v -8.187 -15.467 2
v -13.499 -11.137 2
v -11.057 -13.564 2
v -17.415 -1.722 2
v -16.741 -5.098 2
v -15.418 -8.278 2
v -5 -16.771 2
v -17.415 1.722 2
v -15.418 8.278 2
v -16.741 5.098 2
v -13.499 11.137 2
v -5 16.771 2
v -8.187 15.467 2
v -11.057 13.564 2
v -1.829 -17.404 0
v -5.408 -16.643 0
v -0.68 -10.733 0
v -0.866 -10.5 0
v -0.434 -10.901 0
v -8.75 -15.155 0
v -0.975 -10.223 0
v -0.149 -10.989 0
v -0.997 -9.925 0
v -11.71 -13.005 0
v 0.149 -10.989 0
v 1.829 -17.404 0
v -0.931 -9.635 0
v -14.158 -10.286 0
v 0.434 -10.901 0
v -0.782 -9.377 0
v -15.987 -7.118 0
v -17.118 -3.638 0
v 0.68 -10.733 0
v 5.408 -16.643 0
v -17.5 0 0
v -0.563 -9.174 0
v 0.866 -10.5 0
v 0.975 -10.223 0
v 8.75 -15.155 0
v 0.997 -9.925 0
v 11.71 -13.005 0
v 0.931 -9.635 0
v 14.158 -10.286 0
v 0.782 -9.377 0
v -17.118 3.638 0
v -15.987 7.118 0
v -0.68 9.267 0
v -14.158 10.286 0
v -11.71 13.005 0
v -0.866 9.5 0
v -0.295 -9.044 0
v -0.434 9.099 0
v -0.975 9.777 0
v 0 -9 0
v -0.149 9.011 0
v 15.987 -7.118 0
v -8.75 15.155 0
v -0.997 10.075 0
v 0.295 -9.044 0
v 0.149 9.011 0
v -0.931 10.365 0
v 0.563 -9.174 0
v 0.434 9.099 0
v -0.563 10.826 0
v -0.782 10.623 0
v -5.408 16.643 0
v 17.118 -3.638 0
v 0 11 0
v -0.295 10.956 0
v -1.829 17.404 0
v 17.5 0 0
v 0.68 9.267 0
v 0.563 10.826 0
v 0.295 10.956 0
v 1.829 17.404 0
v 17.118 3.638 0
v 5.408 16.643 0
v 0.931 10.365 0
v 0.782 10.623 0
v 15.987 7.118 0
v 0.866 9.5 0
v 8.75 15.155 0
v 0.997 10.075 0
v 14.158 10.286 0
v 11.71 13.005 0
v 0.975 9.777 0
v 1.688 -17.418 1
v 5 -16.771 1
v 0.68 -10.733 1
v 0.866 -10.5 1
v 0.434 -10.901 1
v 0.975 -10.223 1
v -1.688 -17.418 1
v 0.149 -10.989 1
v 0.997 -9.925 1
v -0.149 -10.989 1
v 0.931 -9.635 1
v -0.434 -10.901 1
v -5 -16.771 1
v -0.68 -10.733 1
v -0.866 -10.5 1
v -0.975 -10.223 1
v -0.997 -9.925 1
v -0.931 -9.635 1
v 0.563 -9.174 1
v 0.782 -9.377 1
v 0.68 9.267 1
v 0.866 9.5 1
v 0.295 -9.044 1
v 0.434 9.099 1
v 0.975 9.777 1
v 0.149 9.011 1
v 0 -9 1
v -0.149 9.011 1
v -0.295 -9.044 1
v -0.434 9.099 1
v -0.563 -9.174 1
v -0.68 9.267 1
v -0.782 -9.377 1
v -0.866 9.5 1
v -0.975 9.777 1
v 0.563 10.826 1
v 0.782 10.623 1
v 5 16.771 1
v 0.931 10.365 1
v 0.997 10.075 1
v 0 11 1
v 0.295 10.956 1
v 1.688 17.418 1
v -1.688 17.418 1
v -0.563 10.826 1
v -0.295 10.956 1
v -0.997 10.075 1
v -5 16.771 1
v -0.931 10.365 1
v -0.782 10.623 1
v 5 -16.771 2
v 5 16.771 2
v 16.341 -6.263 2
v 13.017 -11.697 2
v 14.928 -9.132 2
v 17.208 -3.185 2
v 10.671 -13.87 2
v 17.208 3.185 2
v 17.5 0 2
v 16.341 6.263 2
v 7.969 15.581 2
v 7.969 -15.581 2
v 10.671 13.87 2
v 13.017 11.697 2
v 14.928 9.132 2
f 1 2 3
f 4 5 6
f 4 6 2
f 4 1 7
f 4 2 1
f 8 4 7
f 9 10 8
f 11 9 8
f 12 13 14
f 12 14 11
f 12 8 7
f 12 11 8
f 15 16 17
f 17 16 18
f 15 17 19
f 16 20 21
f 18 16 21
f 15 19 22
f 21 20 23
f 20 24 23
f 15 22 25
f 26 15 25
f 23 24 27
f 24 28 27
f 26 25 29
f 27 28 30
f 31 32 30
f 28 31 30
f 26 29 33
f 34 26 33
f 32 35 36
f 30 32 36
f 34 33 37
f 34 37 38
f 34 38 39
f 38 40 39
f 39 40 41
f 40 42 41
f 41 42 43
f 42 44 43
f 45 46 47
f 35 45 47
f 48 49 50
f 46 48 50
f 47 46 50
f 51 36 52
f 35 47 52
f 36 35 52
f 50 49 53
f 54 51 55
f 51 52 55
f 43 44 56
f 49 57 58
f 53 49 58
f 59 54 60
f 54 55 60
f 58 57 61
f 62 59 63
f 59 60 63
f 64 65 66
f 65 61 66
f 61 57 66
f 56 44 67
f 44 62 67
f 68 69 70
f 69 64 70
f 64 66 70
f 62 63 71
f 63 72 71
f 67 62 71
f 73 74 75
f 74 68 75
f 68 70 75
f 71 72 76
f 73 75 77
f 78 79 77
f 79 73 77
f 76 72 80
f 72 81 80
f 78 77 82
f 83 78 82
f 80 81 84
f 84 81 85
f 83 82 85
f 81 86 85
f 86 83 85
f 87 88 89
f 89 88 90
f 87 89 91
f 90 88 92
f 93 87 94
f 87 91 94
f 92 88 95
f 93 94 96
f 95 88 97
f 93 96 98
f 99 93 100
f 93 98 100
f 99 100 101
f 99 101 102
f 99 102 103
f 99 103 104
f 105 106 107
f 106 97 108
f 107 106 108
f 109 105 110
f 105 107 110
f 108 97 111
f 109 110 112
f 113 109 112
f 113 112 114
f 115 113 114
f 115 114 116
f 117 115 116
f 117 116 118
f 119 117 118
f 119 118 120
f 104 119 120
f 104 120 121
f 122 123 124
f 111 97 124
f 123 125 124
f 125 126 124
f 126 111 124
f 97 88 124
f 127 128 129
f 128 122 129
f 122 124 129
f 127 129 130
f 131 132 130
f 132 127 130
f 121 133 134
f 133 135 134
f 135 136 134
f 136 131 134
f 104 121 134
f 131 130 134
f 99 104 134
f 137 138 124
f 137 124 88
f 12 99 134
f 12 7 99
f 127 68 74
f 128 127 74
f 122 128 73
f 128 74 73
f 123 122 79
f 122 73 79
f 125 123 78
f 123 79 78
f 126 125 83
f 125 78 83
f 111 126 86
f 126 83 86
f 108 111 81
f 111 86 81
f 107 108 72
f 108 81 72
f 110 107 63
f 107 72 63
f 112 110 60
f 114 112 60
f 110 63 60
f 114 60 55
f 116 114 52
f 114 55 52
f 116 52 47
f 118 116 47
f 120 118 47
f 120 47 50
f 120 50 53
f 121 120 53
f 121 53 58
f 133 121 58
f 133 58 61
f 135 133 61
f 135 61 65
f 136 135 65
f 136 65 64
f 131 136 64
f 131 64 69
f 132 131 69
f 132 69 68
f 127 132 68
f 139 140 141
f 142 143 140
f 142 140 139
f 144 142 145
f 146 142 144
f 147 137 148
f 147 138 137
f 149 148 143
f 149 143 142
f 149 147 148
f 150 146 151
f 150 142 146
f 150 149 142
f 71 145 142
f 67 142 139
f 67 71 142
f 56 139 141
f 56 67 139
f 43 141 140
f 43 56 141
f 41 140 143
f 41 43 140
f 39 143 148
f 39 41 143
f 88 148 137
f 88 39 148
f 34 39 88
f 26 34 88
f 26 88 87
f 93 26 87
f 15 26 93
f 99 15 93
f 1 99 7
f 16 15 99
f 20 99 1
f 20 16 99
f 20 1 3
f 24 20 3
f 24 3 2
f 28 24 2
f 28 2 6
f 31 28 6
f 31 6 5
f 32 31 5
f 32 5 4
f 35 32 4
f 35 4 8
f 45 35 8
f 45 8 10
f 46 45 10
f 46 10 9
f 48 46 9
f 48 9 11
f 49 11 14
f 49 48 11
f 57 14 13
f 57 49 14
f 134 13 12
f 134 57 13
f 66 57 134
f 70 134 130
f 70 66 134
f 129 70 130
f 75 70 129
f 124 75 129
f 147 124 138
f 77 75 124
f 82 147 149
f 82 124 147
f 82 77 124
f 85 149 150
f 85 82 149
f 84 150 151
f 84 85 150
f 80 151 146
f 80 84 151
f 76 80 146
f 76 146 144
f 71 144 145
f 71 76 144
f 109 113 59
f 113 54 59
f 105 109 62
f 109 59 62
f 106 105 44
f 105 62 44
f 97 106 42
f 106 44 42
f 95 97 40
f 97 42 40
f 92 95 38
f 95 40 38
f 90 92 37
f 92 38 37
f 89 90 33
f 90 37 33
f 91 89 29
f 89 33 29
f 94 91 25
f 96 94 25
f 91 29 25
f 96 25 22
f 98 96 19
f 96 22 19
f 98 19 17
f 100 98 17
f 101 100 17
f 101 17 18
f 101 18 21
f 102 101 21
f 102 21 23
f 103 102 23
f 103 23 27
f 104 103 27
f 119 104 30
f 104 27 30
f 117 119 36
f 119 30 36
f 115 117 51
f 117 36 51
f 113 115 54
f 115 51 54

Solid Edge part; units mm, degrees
sketch "Sketch1" plane through (0, 0, 0) normal (0, 0, 1) x (1, 0, 0)
  circle A0 centre (0, 0) radius 17.5
extrude "Protrusion1" add sketch "Sketch1" along normal blind 2
sketch "Sketch2" plane through (0, 0, 2) normal (0, 0, 1) x (1, 0, 0)
  line L0 (-5, 17.5) -> (5, 17.5)
  line L1 (5, 17.5) -> (5, -17.5)
  line L2 (5, -17.5) -> (-5, -17.5)
  line L3 (-5, -17.5) -> (-5, 17.5)
  dimension "D1" = 10
extrude "Extrusionsausschnitt_2" cut sketch "Sketch2" against normal blind 1
hole "Bohrung_1" at (0, 10, 0) direction (0, 0, 1) diameter 2 end up to next
pattern_linear "Pattern1" count 2 spacing 20 along (0, -1, 0) of "Bohrung_1"
properties part number "DV4" material "Polypropylen, hochfest"
